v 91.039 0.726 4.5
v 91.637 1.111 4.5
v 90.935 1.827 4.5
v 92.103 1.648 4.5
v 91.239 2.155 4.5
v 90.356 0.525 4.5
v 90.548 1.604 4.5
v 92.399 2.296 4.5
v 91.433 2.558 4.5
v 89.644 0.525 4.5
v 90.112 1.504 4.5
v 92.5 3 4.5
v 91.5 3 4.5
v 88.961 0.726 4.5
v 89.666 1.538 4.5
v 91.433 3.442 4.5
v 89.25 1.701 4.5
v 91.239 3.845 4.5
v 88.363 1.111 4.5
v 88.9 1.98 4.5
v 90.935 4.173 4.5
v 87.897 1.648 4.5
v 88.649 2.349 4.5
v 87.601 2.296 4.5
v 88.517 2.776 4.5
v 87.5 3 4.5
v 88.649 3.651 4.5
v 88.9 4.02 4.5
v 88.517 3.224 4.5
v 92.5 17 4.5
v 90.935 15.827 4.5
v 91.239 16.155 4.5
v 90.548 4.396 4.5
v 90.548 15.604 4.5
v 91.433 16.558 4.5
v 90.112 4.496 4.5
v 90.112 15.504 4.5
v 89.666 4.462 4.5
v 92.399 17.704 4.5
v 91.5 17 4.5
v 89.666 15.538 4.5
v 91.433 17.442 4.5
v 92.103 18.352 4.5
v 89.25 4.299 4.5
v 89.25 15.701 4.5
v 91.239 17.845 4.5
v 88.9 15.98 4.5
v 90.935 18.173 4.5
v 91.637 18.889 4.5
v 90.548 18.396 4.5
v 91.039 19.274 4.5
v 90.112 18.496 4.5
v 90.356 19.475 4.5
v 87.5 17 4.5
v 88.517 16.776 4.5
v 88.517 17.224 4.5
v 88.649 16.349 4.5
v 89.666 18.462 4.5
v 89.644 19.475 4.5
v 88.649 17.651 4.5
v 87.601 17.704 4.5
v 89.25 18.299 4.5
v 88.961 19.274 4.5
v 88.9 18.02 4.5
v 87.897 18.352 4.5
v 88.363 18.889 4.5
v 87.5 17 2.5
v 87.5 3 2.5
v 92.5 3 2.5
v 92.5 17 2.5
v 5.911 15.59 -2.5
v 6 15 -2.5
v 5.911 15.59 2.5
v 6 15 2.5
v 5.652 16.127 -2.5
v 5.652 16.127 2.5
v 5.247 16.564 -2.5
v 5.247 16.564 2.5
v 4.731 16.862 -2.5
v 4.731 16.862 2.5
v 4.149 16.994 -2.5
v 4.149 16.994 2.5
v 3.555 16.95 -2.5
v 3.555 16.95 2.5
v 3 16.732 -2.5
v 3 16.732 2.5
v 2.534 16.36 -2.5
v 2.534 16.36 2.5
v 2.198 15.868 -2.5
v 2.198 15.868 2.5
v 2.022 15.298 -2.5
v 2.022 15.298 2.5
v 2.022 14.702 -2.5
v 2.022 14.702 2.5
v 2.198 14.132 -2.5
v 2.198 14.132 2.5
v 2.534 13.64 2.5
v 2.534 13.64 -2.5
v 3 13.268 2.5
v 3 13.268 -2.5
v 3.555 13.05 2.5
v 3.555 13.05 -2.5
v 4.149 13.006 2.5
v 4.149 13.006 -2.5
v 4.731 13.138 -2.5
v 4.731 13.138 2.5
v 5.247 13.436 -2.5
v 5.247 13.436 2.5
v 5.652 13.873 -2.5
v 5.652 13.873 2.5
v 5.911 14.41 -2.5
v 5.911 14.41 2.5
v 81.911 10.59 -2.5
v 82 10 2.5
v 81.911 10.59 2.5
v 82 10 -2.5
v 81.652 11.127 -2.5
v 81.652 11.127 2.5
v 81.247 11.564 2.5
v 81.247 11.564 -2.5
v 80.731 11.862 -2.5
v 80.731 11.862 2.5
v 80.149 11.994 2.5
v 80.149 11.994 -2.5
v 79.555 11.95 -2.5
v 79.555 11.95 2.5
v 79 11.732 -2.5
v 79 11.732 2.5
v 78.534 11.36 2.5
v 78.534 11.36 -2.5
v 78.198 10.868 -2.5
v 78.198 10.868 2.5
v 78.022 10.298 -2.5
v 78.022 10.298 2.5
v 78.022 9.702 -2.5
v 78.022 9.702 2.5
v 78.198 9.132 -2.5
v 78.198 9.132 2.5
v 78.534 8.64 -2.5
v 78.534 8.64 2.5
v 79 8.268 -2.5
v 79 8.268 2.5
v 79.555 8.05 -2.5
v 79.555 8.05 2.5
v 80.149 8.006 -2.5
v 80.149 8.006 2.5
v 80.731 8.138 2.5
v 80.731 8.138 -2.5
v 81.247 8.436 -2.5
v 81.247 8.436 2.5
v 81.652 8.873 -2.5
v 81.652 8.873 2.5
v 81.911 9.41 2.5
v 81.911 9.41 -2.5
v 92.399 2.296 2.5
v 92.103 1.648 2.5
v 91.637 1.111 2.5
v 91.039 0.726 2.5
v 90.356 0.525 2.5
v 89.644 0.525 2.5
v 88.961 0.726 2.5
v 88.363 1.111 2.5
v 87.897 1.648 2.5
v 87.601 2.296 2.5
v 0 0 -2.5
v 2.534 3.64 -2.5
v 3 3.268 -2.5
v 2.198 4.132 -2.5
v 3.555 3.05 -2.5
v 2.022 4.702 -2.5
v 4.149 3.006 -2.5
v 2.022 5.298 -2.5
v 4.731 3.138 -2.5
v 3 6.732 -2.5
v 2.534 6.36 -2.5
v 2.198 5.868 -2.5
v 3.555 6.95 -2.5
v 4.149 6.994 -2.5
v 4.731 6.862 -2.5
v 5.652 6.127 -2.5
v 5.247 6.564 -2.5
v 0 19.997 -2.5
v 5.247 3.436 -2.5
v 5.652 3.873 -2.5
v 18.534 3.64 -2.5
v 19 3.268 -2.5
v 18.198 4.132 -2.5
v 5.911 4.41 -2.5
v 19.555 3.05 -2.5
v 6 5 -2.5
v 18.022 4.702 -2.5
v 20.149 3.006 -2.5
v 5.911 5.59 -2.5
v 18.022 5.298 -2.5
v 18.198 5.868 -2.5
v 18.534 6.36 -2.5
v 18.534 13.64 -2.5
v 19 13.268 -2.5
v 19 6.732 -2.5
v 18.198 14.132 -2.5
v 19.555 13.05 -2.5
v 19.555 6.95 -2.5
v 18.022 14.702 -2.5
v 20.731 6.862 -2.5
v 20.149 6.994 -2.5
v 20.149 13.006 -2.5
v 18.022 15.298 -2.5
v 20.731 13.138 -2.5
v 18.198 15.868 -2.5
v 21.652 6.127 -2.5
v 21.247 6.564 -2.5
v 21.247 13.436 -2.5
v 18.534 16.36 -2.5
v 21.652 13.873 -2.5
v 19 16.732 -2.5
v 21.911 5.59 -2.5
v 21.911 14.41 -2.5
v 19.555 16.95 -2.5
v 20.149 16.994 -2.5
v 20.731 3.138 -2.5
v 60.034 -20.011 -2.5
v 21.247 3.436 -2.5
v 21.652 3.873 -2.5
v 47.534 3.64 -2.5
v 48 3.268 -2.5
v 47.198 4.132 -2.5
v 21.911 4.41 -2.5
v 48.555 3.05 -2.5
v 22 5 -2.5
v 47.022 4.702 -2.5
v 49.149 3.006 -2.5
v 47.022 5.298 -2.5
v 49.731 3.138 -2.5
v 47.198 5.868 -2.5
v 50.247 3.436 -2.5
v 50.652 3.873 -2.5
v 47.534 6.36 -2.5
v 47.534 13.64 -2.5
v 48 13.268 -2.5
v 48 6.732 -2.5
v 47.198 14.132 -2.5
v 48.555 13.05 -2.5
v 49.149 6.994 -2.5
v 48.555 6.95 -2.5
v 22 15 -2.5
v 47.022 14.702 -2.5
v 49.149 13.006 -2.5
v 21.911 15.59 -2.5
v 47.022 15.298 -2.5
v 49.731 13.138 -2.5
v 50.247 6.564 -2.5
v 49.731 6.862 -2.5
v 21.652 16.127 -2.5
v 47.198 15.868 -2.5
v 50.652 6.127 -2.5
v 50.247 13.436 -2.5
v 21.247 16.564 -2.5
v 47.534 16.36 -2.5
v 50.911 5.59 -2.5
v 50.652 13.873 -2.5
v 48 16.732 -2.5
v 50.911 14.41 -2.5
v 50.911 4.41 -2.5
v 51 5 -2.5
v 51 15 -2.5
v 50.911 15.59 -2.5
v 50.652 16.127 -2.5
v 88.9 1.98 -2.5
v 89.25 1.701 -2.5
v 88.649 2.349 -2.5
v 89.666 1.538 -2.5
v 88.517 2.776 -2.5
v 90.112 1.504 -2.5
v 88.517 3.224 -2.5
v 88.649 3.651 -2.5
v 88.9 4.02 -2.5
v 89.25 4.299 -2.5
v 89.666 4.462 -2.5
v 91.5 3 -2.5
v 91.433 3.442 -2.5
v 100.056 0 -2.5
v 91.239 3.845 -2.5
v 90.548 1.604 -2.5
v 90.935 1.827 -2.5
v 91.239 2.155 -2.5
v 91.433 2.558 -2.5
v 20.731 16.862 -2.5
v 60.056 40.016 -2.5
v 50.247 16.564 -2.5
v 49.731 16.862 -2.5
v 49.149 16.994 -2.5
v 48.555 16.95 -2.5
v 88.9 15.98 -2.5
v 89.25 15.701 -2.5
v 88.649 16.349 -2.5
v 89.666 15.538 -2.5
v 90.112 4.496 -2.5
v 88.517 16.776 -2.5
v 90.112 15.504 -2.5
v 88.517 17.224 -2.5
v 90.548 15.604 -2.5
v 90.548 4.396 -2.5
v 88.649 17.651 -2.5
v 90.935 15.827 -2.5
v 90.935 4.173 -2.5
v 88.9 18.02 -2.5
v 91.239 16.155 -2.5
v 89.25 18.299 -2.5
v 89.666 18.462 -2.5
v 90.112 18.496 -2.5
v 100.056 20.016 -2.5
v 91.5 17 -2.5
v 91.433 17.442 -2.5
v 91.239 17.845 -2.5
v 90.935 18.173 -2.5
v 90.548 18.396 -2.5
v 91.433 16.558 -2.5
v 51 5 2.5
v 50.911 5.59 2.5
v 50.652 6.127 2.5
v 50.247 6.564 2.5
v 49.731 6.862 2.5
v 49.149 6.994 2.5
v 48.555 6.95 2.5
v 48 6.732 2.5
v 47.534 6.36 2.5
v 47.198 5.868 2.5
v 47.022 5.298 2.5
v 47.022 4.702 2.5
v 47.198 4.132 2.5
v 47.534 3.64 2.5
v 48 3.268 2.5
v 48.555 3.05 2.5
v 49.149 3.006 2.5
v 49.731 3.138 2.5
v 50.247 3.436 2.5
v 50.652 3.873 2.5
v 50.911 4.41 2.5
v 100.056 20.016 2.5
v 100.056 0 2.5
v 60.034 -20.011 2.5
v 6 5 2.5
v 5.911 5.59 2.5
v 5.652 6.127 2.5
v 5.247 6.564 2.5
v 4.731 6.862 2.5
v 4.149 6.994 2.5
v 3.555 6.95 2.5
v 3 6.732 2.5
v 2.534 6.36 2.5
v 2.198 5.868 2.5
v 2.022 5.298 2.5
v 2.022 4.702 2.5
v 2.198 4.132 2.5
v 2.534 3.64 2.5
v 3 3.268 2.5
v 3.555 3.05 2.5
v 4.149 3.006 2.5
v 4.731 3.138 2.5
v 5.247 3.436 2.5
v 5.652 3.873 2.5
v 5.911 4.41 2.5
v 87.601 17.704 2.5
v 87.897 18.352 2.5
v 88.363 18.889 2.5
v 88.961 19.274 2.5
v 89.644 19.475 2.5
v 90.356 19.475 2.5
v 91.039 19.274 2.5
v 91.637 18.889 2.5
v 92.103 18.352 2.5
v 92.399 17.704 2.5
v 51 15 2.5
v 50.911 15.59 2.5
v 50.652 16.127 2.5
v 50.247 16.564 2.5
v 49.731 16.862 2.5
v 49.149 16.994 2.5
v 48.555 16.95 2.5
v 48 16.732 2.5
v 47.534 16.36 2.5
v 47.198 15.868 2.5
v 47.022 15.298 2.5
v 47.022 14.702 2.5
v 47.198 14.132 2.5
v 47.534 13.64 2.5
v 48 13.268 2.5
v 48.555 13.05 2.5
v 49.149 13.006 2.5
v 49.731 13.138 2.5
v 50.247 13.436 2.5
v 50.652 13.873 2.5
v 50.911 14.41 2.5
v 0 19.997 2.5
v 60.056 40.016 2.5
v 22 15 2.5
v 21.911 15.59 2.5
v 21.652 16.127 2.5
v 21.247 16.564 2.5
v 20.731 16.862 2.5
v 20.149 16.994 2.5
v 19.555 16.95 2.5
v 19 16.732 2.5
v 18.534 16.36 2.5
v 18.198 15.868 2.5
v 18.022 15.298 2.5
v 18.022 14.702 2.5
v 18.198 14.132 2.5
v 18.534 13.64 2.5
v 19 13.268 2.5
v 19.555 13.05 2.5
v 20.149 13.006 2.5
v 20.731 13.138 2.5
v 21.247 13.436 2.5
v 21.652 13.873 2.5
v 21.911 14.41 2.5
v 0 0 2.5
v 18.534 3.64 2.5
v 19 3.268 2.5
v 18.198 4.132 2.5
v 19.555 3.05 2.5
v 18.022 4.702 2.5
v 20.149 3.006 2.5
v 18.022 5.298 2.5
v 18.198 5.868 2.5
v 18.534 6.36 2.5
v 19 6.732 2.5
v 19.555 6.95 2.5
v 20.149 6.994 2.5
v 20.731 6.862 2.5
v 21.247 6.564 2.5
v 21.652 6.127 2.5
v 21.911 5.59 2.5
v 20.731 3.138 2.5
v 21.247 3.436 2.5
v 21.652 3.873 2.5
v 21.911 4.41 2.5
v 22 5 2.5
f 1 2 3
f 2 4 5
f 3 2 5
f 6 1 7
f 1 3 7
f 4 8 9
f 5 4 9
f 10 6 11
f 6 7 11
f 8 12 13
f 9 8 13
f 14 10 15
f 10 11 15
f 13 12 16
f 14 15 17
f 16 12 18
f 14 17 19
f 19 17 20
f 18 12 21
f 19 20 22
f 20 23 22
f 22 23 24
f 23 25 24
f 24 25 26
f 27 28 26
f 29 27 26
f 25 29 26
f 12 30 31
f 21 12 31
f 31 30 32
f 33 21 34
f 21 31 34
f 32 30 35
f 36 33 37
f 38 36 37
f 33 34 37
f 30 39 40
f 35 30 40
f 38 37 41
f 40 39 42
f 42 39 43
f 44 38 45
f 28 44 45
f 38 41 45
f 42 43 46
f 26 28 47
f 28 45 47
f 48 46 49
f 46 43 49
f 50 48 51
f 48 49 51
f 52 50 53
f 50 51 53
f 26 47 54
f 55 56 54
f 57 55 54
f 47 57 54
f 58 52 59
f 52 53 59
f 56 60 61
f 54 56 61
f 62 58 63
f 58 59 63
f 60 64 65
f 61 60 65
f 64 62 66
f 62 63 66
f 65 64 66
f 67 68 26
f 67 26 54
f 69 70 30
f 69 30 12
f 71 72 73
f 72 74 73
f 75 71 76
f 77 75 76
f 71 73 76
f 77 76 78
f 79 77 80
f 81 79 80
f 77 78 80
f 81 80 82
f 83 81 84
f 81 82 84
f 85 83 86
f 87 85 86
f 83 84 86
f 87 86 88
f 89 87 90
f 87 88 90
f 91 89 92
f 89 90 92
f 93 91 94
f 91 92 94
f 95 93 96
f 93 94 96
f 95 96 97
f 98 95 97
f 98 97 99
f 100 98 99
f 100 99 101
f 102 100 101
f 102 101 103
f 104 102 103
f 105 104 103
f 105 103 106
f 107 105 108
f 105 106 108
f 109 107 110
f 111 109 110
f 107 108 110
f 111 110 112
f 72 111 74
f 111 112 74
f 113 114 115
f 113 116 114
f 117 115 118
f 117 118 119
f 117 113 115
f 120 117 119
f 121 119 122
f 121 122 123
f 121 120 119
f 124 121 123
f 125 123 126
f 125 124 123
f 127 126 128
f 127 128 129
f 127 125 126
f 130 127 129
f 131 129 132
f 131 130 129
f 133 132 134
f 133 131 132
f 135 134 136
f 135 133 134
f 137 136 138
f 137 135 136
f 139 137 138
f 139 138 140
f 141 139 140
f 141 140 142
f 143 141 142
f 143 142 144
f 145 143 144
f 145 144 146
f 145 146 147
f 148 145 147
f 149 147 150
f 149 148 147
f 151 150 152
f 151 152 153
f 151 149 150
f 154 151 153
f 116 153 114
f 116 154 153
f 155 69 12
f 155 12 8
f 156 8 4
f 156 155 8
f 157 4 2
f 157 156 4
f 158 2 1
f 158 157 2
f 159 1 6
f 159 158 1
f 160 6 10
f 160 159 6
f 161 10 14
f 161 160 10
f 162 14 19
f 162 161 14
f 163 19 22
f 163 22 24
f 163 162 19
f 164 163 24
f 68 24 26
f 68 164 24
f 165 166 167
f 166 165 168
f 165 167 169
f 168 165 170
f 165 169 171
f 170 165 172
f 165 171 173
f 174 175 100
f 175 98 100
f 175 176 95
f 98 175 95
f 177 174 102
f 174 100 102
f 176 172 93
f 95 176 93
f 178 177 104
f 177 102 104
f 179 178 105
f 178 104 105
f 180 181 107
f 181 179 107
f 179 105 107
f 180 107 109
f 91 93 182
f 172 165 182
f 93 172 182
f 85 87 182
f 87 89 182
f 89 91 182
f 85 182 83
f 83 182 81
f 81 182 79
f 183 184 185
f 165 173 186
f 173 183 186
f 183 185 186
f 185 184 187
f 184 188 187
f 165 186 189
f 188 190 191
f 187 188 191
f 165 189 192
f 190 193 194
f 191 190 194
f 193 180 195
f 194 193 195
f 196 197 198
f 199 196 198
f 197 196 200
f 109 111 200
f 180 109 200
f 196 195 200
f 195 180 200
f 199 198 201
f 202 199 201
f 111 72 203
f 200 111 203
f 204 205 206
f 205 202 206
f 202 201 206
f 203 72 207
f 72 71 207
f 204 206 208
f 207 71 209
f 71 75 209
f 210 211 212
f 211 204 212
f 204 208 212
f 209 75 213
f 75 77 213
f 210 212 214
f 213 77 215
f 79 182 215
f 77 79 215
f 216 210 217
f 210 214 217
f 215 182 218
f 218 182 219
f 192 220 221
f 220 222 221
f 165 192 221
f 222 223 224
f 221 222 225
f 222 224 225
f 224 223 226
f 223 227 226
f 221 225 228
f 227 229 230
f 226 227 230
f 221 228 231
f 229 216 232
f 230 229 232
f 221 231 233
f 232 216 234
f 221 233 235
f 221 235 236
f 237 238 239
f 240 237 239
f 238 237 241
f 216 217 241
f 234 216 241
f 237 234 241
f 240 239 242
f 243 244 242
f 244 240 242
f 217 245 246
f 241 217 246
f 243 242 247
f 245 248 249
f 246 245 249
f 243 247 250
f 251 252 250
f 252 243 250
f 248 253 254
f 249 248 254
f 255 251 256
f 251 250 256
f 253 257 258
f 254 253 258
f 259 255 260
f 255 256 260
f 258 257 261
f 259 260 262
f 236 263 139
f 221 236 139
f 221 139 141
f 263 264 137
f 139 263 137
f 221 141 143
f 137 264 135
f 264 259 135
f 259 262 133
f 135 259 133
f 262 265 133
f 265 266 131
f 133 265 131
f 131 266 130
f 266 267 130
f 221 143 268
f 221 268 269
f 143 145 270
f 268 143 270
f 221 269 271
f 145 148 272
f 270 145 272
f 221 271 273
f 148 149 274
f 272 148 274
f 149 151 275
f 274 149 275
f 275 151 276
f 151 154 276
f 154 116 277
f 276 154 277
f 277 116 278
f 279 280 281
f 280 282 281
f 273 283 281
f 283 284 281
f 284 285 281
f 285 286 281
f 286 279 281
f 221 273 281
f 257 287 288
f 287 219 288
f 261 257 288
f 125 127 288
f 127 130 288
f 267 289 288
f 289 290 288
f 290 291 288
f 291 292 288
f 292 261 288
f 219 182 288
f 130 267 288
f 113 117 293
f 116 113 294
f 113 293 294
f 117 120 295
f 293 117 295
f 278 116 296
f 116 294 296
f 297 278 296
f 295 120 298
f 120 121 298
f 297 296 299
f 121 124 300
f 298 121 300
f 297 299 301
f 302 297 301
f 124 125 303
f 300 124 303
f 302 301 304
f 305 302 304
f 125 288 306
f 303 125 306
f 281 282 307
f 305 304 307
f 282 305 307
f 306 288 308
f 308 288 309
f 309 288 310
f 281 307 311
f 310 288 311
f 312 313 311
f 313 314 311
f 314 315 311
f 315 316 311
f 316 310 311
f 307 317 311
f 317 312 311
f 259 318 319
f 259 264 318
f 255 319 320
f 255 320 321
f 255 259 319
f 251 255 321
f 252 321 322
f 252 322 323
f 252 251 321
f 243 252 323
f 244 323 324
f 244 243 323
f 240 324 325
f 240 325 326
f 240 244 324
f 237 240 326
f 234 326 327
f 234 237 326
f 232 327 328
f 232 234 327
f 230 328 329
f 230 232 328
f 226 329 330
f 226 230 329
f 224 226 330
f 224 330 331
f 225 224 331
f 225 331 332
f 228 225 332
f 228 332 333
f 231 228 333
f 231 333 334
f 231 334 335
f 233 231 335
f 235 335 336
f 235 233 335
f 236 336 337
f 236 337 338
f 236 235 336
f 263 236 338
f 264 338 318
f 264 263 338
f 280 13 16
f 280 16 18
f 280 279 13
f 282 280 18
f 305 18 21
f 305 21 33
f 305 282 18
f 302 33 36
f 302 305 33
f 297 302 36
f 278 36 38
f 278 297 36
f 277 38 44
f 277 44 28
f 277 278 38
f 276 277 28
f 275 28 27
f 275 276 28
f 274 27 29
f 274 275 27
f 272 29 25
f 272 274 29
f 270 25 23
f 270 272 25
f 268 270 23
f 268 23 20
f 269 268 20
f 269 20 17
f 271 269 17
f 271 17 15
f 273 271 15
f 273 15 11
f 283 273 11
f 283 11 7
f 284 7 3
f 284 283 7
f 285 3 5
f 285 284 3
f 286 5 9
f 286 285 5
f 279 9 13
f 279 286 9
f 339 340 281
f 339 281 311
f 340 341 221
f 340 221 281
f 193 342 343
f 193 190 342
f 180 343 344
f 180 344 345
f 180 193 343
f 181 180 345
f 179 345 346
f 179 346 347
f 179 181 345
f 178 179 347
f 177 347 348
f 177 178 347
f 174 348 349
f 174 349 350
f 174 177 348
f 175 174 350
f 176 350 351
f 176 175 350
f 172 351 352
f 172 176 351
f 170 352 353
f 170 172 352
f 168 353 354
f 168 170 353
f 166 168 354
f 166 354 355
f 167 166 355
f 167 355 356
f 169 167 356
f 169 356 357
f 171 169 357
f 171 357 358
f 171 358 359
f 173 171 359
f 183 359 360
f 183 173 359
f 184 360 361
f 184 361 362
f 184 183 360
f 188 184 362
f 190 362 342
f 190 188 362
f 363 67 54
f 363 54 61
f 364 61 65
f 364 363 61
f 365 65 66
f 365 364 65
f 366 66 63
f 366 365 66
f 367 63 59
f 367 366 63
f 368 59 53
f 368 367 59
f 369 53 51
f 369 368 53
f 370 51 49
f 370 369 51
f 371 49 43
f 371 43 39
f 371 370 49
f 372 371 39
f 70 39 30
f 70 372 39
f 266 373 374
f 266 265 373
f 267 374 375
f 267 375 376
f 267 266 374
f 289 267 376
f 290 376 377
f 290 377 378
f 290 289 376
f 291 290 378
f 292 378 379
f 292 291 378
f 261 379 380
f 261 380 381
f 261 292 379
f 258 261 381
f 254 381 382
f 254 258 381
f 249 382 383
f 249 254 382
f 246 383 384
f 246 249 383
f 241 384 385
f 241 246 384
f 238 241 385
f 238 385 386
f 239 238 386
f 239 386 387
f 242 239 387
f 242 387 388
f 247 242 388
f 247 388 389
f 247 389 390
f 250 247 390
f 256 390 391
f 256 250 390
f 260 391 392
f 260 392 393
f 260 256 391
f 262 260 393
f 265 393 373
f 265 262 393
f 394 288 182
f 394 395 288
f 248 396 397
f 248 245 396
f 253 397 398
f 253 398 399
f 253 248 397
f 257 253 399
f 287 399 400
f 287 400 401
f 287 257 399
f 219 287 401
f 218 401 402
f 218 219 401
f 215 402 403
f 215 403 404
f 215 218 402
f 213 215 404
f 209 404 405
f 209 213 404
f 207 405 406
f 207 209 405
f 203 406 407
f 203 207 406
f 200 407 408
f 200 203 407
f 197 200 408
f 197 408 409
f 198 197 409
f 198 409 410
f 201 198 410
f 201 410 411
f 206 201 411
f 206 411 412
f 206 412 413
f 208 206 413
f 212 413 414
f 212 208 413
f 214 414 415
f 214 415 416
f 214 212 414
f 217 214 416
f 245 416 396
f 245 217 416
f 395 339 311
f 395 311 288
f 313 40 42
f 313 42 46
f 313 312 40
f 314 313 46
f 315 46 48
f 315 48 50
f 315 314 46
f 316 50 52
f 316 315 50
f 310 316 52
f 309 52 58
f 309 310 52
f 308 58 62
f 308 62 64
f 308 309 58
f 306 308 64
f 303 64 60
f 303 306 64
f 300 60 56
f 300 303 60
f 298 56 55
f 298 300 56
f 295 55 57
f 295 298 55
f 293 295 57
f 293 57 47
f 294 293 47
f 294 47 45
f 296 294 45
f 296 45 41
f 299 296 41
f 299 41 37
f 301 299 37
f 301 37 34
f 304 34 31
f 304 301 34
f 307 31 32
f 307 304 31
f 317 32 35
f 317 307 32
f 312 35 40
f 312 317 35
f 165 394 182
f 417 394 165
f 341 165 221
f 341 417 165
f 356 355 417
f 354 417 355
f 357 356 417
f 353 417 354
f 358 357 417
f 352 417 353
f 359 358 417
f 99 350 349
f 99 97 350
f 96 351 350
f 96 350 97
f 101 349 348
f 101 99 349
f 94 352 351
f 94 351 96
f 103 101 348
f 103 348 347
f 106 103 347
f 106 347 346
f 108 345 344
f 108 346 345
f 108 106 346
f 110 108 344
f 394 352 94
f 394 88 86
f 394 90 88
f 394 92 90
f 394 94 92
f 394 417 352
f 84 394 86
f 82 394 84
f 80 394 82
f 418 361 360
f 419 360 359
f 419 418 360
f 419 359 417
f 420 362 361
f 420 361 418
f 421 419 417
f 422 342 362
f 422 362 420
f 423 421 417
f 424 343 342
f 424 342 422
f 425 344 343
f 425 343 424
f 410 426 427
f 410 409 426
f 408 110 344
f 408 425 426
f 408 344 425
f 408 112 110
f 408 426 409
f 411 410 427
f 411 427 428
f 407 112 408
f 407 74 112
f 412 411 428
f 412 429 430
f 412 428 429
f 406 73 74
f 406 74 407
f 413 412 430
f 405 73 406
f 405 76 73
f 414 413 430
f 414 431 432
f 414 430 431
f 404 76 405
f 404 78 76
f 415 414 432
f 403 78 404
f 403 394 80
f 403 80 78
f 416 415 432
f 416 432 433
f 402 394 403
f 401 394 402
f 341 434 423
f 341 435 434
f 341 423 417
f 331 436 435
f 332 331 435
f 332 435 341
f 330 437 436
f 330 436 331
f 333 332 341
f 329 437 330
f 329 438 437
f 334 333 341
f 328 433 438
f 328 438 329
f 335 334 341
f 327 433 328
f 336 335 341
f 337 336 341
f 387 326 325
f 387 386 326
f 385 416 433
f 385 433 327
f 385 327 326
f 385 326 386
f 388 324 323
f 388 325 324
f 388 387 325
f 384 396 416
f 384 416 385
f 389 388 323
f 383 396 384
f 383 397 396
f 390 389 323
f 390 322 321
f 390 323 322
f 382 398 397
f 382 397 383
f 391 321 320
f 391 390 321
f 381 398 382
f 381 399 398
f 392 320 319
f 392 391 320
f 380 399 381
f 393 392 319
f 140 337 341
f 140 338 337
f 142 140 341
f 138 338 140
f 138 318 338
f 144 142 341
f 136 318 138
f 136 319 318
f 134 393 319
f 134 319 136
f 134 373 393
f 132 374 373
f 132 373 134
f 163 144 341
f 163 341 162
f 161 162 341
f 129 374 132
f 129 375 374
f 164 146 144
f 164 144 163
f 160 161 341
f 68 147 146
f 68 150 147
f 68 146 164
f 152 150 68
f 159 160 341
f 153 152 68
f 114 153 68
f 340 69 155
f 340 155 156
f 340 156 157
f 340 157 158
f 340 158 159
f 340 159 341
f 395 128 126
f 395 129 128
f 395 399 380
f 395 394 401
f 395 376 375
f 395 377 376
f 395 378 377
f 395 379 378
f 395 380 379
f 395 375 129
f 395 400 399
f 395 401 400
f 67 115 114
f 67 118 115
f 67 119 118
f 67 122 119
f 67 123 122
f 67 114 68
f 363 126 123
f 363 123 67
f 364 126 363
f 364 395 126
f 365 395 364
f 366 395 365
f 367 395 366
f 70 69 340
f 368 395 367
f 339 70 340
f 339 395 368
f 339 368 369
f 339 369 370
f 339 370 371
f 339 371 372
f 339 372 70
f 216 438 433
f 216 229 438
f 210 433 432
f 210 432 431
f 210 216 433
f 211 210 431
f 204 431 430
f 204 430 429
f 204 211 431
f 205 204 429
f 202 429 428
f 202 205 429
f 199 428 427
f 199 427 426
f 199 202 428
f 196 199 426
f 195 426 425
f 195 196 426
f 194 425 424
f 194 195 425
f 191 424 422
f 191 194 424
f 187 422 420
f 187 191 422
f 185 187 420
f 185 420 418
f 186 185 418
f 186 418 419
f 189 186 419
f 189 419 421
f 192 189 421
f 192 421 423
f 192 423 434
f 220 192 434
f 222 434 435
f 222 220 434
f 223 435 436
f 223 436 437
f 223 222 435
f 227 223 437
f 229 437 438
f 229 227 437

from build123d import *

# Parameters (mm, degrees)
SKETCH_1_R          = 2
SKETCH_1_R_2        = 1.5
EXTRUDE_1_DEPTH     = 2.5
SKETCH_2_R          = 2
CUT_EXTRUDE_1_DEPTH = 2.5
SKETCH_3_R          = 1.5
EXTRUDE_2_DEPTH     = 2


with BuildPart() as part:
    # 草图1 → 凸台-拉伸1 (new, symmetric)
    with BuildSketch(Plane.XY):
        Polygon((0, 0), (60.033704039, -20.01123468), (100.056173399, 0), (100.056173399, 20.015752082), (60.056173399, 40.015752082), (0, 19.997027615), align=None)
        with Locations((20, 5)):
            Circle(SKETCH_1_R, mode=Mode.SUBTRACT)
        with Locations((20, 15)):
            Circle(SKETCH_1_R, mode=Mode.SUBTRACT)
        with Locations((49, 5)):
            Circle(SKETCH_1_R, mode=Mode.SUBTRACT)
        with Locations((49, 15)):
            Circle(SKETCH_1_R, mode=Mode.SUBTRACT)
        with Locations((90, 17)):
            Circle(SKETCH_1_R_2, mode=Mode.SUBTRACT)
        with Locations((90, 3)):
            Circle(SKETCH_1_R_2, mode=Mode.SUBTRACT)
    extrude(amount=EXTRUDE_1_DEPTH, both=True)

    # 草图2 → 切除-拉伸1 (cut, symmetric)
    with BuildSketch(Plane.XY):
        with Locations((80, 10)):
            Circle(SKETCH_2_R)
        with Locations((4, 5)):
            Circle(SKETCH_2_R)
        with Locations((4, 15)):
            Circle(SKETCH_2_R)
    extrude(amount=CUT_EXTRUDE_1_DEPTH, both=True, mode=Mode.SUBTRACT)

    # 草图3 → 凸台-拉伸2 (add)
    with BuildSketch(Plane.XY.offset(2.5)):
        with BuildLine():
            Line((92.5, 17), (92.5, 3))
            ThreePointArc((92.5, 3), (90, 0.5), (87.5, 3))
            Line((87.5, 3), (87.5, 17))
            ThreePointArc((87.5, 17), (90, 19.5), (92.5, 17))
        make_face()
        with Locations((90, 17)):
            Circle(SKETCH_3_R, mode=Mode.SUBTRACT)
        with Locations((90, 3)):
            Circle(SKETCH_3_R, mode=Mode.SUBTRACT)
    extrude(amount=EXTRUDE_2_DEPTH)


solid = part.part
